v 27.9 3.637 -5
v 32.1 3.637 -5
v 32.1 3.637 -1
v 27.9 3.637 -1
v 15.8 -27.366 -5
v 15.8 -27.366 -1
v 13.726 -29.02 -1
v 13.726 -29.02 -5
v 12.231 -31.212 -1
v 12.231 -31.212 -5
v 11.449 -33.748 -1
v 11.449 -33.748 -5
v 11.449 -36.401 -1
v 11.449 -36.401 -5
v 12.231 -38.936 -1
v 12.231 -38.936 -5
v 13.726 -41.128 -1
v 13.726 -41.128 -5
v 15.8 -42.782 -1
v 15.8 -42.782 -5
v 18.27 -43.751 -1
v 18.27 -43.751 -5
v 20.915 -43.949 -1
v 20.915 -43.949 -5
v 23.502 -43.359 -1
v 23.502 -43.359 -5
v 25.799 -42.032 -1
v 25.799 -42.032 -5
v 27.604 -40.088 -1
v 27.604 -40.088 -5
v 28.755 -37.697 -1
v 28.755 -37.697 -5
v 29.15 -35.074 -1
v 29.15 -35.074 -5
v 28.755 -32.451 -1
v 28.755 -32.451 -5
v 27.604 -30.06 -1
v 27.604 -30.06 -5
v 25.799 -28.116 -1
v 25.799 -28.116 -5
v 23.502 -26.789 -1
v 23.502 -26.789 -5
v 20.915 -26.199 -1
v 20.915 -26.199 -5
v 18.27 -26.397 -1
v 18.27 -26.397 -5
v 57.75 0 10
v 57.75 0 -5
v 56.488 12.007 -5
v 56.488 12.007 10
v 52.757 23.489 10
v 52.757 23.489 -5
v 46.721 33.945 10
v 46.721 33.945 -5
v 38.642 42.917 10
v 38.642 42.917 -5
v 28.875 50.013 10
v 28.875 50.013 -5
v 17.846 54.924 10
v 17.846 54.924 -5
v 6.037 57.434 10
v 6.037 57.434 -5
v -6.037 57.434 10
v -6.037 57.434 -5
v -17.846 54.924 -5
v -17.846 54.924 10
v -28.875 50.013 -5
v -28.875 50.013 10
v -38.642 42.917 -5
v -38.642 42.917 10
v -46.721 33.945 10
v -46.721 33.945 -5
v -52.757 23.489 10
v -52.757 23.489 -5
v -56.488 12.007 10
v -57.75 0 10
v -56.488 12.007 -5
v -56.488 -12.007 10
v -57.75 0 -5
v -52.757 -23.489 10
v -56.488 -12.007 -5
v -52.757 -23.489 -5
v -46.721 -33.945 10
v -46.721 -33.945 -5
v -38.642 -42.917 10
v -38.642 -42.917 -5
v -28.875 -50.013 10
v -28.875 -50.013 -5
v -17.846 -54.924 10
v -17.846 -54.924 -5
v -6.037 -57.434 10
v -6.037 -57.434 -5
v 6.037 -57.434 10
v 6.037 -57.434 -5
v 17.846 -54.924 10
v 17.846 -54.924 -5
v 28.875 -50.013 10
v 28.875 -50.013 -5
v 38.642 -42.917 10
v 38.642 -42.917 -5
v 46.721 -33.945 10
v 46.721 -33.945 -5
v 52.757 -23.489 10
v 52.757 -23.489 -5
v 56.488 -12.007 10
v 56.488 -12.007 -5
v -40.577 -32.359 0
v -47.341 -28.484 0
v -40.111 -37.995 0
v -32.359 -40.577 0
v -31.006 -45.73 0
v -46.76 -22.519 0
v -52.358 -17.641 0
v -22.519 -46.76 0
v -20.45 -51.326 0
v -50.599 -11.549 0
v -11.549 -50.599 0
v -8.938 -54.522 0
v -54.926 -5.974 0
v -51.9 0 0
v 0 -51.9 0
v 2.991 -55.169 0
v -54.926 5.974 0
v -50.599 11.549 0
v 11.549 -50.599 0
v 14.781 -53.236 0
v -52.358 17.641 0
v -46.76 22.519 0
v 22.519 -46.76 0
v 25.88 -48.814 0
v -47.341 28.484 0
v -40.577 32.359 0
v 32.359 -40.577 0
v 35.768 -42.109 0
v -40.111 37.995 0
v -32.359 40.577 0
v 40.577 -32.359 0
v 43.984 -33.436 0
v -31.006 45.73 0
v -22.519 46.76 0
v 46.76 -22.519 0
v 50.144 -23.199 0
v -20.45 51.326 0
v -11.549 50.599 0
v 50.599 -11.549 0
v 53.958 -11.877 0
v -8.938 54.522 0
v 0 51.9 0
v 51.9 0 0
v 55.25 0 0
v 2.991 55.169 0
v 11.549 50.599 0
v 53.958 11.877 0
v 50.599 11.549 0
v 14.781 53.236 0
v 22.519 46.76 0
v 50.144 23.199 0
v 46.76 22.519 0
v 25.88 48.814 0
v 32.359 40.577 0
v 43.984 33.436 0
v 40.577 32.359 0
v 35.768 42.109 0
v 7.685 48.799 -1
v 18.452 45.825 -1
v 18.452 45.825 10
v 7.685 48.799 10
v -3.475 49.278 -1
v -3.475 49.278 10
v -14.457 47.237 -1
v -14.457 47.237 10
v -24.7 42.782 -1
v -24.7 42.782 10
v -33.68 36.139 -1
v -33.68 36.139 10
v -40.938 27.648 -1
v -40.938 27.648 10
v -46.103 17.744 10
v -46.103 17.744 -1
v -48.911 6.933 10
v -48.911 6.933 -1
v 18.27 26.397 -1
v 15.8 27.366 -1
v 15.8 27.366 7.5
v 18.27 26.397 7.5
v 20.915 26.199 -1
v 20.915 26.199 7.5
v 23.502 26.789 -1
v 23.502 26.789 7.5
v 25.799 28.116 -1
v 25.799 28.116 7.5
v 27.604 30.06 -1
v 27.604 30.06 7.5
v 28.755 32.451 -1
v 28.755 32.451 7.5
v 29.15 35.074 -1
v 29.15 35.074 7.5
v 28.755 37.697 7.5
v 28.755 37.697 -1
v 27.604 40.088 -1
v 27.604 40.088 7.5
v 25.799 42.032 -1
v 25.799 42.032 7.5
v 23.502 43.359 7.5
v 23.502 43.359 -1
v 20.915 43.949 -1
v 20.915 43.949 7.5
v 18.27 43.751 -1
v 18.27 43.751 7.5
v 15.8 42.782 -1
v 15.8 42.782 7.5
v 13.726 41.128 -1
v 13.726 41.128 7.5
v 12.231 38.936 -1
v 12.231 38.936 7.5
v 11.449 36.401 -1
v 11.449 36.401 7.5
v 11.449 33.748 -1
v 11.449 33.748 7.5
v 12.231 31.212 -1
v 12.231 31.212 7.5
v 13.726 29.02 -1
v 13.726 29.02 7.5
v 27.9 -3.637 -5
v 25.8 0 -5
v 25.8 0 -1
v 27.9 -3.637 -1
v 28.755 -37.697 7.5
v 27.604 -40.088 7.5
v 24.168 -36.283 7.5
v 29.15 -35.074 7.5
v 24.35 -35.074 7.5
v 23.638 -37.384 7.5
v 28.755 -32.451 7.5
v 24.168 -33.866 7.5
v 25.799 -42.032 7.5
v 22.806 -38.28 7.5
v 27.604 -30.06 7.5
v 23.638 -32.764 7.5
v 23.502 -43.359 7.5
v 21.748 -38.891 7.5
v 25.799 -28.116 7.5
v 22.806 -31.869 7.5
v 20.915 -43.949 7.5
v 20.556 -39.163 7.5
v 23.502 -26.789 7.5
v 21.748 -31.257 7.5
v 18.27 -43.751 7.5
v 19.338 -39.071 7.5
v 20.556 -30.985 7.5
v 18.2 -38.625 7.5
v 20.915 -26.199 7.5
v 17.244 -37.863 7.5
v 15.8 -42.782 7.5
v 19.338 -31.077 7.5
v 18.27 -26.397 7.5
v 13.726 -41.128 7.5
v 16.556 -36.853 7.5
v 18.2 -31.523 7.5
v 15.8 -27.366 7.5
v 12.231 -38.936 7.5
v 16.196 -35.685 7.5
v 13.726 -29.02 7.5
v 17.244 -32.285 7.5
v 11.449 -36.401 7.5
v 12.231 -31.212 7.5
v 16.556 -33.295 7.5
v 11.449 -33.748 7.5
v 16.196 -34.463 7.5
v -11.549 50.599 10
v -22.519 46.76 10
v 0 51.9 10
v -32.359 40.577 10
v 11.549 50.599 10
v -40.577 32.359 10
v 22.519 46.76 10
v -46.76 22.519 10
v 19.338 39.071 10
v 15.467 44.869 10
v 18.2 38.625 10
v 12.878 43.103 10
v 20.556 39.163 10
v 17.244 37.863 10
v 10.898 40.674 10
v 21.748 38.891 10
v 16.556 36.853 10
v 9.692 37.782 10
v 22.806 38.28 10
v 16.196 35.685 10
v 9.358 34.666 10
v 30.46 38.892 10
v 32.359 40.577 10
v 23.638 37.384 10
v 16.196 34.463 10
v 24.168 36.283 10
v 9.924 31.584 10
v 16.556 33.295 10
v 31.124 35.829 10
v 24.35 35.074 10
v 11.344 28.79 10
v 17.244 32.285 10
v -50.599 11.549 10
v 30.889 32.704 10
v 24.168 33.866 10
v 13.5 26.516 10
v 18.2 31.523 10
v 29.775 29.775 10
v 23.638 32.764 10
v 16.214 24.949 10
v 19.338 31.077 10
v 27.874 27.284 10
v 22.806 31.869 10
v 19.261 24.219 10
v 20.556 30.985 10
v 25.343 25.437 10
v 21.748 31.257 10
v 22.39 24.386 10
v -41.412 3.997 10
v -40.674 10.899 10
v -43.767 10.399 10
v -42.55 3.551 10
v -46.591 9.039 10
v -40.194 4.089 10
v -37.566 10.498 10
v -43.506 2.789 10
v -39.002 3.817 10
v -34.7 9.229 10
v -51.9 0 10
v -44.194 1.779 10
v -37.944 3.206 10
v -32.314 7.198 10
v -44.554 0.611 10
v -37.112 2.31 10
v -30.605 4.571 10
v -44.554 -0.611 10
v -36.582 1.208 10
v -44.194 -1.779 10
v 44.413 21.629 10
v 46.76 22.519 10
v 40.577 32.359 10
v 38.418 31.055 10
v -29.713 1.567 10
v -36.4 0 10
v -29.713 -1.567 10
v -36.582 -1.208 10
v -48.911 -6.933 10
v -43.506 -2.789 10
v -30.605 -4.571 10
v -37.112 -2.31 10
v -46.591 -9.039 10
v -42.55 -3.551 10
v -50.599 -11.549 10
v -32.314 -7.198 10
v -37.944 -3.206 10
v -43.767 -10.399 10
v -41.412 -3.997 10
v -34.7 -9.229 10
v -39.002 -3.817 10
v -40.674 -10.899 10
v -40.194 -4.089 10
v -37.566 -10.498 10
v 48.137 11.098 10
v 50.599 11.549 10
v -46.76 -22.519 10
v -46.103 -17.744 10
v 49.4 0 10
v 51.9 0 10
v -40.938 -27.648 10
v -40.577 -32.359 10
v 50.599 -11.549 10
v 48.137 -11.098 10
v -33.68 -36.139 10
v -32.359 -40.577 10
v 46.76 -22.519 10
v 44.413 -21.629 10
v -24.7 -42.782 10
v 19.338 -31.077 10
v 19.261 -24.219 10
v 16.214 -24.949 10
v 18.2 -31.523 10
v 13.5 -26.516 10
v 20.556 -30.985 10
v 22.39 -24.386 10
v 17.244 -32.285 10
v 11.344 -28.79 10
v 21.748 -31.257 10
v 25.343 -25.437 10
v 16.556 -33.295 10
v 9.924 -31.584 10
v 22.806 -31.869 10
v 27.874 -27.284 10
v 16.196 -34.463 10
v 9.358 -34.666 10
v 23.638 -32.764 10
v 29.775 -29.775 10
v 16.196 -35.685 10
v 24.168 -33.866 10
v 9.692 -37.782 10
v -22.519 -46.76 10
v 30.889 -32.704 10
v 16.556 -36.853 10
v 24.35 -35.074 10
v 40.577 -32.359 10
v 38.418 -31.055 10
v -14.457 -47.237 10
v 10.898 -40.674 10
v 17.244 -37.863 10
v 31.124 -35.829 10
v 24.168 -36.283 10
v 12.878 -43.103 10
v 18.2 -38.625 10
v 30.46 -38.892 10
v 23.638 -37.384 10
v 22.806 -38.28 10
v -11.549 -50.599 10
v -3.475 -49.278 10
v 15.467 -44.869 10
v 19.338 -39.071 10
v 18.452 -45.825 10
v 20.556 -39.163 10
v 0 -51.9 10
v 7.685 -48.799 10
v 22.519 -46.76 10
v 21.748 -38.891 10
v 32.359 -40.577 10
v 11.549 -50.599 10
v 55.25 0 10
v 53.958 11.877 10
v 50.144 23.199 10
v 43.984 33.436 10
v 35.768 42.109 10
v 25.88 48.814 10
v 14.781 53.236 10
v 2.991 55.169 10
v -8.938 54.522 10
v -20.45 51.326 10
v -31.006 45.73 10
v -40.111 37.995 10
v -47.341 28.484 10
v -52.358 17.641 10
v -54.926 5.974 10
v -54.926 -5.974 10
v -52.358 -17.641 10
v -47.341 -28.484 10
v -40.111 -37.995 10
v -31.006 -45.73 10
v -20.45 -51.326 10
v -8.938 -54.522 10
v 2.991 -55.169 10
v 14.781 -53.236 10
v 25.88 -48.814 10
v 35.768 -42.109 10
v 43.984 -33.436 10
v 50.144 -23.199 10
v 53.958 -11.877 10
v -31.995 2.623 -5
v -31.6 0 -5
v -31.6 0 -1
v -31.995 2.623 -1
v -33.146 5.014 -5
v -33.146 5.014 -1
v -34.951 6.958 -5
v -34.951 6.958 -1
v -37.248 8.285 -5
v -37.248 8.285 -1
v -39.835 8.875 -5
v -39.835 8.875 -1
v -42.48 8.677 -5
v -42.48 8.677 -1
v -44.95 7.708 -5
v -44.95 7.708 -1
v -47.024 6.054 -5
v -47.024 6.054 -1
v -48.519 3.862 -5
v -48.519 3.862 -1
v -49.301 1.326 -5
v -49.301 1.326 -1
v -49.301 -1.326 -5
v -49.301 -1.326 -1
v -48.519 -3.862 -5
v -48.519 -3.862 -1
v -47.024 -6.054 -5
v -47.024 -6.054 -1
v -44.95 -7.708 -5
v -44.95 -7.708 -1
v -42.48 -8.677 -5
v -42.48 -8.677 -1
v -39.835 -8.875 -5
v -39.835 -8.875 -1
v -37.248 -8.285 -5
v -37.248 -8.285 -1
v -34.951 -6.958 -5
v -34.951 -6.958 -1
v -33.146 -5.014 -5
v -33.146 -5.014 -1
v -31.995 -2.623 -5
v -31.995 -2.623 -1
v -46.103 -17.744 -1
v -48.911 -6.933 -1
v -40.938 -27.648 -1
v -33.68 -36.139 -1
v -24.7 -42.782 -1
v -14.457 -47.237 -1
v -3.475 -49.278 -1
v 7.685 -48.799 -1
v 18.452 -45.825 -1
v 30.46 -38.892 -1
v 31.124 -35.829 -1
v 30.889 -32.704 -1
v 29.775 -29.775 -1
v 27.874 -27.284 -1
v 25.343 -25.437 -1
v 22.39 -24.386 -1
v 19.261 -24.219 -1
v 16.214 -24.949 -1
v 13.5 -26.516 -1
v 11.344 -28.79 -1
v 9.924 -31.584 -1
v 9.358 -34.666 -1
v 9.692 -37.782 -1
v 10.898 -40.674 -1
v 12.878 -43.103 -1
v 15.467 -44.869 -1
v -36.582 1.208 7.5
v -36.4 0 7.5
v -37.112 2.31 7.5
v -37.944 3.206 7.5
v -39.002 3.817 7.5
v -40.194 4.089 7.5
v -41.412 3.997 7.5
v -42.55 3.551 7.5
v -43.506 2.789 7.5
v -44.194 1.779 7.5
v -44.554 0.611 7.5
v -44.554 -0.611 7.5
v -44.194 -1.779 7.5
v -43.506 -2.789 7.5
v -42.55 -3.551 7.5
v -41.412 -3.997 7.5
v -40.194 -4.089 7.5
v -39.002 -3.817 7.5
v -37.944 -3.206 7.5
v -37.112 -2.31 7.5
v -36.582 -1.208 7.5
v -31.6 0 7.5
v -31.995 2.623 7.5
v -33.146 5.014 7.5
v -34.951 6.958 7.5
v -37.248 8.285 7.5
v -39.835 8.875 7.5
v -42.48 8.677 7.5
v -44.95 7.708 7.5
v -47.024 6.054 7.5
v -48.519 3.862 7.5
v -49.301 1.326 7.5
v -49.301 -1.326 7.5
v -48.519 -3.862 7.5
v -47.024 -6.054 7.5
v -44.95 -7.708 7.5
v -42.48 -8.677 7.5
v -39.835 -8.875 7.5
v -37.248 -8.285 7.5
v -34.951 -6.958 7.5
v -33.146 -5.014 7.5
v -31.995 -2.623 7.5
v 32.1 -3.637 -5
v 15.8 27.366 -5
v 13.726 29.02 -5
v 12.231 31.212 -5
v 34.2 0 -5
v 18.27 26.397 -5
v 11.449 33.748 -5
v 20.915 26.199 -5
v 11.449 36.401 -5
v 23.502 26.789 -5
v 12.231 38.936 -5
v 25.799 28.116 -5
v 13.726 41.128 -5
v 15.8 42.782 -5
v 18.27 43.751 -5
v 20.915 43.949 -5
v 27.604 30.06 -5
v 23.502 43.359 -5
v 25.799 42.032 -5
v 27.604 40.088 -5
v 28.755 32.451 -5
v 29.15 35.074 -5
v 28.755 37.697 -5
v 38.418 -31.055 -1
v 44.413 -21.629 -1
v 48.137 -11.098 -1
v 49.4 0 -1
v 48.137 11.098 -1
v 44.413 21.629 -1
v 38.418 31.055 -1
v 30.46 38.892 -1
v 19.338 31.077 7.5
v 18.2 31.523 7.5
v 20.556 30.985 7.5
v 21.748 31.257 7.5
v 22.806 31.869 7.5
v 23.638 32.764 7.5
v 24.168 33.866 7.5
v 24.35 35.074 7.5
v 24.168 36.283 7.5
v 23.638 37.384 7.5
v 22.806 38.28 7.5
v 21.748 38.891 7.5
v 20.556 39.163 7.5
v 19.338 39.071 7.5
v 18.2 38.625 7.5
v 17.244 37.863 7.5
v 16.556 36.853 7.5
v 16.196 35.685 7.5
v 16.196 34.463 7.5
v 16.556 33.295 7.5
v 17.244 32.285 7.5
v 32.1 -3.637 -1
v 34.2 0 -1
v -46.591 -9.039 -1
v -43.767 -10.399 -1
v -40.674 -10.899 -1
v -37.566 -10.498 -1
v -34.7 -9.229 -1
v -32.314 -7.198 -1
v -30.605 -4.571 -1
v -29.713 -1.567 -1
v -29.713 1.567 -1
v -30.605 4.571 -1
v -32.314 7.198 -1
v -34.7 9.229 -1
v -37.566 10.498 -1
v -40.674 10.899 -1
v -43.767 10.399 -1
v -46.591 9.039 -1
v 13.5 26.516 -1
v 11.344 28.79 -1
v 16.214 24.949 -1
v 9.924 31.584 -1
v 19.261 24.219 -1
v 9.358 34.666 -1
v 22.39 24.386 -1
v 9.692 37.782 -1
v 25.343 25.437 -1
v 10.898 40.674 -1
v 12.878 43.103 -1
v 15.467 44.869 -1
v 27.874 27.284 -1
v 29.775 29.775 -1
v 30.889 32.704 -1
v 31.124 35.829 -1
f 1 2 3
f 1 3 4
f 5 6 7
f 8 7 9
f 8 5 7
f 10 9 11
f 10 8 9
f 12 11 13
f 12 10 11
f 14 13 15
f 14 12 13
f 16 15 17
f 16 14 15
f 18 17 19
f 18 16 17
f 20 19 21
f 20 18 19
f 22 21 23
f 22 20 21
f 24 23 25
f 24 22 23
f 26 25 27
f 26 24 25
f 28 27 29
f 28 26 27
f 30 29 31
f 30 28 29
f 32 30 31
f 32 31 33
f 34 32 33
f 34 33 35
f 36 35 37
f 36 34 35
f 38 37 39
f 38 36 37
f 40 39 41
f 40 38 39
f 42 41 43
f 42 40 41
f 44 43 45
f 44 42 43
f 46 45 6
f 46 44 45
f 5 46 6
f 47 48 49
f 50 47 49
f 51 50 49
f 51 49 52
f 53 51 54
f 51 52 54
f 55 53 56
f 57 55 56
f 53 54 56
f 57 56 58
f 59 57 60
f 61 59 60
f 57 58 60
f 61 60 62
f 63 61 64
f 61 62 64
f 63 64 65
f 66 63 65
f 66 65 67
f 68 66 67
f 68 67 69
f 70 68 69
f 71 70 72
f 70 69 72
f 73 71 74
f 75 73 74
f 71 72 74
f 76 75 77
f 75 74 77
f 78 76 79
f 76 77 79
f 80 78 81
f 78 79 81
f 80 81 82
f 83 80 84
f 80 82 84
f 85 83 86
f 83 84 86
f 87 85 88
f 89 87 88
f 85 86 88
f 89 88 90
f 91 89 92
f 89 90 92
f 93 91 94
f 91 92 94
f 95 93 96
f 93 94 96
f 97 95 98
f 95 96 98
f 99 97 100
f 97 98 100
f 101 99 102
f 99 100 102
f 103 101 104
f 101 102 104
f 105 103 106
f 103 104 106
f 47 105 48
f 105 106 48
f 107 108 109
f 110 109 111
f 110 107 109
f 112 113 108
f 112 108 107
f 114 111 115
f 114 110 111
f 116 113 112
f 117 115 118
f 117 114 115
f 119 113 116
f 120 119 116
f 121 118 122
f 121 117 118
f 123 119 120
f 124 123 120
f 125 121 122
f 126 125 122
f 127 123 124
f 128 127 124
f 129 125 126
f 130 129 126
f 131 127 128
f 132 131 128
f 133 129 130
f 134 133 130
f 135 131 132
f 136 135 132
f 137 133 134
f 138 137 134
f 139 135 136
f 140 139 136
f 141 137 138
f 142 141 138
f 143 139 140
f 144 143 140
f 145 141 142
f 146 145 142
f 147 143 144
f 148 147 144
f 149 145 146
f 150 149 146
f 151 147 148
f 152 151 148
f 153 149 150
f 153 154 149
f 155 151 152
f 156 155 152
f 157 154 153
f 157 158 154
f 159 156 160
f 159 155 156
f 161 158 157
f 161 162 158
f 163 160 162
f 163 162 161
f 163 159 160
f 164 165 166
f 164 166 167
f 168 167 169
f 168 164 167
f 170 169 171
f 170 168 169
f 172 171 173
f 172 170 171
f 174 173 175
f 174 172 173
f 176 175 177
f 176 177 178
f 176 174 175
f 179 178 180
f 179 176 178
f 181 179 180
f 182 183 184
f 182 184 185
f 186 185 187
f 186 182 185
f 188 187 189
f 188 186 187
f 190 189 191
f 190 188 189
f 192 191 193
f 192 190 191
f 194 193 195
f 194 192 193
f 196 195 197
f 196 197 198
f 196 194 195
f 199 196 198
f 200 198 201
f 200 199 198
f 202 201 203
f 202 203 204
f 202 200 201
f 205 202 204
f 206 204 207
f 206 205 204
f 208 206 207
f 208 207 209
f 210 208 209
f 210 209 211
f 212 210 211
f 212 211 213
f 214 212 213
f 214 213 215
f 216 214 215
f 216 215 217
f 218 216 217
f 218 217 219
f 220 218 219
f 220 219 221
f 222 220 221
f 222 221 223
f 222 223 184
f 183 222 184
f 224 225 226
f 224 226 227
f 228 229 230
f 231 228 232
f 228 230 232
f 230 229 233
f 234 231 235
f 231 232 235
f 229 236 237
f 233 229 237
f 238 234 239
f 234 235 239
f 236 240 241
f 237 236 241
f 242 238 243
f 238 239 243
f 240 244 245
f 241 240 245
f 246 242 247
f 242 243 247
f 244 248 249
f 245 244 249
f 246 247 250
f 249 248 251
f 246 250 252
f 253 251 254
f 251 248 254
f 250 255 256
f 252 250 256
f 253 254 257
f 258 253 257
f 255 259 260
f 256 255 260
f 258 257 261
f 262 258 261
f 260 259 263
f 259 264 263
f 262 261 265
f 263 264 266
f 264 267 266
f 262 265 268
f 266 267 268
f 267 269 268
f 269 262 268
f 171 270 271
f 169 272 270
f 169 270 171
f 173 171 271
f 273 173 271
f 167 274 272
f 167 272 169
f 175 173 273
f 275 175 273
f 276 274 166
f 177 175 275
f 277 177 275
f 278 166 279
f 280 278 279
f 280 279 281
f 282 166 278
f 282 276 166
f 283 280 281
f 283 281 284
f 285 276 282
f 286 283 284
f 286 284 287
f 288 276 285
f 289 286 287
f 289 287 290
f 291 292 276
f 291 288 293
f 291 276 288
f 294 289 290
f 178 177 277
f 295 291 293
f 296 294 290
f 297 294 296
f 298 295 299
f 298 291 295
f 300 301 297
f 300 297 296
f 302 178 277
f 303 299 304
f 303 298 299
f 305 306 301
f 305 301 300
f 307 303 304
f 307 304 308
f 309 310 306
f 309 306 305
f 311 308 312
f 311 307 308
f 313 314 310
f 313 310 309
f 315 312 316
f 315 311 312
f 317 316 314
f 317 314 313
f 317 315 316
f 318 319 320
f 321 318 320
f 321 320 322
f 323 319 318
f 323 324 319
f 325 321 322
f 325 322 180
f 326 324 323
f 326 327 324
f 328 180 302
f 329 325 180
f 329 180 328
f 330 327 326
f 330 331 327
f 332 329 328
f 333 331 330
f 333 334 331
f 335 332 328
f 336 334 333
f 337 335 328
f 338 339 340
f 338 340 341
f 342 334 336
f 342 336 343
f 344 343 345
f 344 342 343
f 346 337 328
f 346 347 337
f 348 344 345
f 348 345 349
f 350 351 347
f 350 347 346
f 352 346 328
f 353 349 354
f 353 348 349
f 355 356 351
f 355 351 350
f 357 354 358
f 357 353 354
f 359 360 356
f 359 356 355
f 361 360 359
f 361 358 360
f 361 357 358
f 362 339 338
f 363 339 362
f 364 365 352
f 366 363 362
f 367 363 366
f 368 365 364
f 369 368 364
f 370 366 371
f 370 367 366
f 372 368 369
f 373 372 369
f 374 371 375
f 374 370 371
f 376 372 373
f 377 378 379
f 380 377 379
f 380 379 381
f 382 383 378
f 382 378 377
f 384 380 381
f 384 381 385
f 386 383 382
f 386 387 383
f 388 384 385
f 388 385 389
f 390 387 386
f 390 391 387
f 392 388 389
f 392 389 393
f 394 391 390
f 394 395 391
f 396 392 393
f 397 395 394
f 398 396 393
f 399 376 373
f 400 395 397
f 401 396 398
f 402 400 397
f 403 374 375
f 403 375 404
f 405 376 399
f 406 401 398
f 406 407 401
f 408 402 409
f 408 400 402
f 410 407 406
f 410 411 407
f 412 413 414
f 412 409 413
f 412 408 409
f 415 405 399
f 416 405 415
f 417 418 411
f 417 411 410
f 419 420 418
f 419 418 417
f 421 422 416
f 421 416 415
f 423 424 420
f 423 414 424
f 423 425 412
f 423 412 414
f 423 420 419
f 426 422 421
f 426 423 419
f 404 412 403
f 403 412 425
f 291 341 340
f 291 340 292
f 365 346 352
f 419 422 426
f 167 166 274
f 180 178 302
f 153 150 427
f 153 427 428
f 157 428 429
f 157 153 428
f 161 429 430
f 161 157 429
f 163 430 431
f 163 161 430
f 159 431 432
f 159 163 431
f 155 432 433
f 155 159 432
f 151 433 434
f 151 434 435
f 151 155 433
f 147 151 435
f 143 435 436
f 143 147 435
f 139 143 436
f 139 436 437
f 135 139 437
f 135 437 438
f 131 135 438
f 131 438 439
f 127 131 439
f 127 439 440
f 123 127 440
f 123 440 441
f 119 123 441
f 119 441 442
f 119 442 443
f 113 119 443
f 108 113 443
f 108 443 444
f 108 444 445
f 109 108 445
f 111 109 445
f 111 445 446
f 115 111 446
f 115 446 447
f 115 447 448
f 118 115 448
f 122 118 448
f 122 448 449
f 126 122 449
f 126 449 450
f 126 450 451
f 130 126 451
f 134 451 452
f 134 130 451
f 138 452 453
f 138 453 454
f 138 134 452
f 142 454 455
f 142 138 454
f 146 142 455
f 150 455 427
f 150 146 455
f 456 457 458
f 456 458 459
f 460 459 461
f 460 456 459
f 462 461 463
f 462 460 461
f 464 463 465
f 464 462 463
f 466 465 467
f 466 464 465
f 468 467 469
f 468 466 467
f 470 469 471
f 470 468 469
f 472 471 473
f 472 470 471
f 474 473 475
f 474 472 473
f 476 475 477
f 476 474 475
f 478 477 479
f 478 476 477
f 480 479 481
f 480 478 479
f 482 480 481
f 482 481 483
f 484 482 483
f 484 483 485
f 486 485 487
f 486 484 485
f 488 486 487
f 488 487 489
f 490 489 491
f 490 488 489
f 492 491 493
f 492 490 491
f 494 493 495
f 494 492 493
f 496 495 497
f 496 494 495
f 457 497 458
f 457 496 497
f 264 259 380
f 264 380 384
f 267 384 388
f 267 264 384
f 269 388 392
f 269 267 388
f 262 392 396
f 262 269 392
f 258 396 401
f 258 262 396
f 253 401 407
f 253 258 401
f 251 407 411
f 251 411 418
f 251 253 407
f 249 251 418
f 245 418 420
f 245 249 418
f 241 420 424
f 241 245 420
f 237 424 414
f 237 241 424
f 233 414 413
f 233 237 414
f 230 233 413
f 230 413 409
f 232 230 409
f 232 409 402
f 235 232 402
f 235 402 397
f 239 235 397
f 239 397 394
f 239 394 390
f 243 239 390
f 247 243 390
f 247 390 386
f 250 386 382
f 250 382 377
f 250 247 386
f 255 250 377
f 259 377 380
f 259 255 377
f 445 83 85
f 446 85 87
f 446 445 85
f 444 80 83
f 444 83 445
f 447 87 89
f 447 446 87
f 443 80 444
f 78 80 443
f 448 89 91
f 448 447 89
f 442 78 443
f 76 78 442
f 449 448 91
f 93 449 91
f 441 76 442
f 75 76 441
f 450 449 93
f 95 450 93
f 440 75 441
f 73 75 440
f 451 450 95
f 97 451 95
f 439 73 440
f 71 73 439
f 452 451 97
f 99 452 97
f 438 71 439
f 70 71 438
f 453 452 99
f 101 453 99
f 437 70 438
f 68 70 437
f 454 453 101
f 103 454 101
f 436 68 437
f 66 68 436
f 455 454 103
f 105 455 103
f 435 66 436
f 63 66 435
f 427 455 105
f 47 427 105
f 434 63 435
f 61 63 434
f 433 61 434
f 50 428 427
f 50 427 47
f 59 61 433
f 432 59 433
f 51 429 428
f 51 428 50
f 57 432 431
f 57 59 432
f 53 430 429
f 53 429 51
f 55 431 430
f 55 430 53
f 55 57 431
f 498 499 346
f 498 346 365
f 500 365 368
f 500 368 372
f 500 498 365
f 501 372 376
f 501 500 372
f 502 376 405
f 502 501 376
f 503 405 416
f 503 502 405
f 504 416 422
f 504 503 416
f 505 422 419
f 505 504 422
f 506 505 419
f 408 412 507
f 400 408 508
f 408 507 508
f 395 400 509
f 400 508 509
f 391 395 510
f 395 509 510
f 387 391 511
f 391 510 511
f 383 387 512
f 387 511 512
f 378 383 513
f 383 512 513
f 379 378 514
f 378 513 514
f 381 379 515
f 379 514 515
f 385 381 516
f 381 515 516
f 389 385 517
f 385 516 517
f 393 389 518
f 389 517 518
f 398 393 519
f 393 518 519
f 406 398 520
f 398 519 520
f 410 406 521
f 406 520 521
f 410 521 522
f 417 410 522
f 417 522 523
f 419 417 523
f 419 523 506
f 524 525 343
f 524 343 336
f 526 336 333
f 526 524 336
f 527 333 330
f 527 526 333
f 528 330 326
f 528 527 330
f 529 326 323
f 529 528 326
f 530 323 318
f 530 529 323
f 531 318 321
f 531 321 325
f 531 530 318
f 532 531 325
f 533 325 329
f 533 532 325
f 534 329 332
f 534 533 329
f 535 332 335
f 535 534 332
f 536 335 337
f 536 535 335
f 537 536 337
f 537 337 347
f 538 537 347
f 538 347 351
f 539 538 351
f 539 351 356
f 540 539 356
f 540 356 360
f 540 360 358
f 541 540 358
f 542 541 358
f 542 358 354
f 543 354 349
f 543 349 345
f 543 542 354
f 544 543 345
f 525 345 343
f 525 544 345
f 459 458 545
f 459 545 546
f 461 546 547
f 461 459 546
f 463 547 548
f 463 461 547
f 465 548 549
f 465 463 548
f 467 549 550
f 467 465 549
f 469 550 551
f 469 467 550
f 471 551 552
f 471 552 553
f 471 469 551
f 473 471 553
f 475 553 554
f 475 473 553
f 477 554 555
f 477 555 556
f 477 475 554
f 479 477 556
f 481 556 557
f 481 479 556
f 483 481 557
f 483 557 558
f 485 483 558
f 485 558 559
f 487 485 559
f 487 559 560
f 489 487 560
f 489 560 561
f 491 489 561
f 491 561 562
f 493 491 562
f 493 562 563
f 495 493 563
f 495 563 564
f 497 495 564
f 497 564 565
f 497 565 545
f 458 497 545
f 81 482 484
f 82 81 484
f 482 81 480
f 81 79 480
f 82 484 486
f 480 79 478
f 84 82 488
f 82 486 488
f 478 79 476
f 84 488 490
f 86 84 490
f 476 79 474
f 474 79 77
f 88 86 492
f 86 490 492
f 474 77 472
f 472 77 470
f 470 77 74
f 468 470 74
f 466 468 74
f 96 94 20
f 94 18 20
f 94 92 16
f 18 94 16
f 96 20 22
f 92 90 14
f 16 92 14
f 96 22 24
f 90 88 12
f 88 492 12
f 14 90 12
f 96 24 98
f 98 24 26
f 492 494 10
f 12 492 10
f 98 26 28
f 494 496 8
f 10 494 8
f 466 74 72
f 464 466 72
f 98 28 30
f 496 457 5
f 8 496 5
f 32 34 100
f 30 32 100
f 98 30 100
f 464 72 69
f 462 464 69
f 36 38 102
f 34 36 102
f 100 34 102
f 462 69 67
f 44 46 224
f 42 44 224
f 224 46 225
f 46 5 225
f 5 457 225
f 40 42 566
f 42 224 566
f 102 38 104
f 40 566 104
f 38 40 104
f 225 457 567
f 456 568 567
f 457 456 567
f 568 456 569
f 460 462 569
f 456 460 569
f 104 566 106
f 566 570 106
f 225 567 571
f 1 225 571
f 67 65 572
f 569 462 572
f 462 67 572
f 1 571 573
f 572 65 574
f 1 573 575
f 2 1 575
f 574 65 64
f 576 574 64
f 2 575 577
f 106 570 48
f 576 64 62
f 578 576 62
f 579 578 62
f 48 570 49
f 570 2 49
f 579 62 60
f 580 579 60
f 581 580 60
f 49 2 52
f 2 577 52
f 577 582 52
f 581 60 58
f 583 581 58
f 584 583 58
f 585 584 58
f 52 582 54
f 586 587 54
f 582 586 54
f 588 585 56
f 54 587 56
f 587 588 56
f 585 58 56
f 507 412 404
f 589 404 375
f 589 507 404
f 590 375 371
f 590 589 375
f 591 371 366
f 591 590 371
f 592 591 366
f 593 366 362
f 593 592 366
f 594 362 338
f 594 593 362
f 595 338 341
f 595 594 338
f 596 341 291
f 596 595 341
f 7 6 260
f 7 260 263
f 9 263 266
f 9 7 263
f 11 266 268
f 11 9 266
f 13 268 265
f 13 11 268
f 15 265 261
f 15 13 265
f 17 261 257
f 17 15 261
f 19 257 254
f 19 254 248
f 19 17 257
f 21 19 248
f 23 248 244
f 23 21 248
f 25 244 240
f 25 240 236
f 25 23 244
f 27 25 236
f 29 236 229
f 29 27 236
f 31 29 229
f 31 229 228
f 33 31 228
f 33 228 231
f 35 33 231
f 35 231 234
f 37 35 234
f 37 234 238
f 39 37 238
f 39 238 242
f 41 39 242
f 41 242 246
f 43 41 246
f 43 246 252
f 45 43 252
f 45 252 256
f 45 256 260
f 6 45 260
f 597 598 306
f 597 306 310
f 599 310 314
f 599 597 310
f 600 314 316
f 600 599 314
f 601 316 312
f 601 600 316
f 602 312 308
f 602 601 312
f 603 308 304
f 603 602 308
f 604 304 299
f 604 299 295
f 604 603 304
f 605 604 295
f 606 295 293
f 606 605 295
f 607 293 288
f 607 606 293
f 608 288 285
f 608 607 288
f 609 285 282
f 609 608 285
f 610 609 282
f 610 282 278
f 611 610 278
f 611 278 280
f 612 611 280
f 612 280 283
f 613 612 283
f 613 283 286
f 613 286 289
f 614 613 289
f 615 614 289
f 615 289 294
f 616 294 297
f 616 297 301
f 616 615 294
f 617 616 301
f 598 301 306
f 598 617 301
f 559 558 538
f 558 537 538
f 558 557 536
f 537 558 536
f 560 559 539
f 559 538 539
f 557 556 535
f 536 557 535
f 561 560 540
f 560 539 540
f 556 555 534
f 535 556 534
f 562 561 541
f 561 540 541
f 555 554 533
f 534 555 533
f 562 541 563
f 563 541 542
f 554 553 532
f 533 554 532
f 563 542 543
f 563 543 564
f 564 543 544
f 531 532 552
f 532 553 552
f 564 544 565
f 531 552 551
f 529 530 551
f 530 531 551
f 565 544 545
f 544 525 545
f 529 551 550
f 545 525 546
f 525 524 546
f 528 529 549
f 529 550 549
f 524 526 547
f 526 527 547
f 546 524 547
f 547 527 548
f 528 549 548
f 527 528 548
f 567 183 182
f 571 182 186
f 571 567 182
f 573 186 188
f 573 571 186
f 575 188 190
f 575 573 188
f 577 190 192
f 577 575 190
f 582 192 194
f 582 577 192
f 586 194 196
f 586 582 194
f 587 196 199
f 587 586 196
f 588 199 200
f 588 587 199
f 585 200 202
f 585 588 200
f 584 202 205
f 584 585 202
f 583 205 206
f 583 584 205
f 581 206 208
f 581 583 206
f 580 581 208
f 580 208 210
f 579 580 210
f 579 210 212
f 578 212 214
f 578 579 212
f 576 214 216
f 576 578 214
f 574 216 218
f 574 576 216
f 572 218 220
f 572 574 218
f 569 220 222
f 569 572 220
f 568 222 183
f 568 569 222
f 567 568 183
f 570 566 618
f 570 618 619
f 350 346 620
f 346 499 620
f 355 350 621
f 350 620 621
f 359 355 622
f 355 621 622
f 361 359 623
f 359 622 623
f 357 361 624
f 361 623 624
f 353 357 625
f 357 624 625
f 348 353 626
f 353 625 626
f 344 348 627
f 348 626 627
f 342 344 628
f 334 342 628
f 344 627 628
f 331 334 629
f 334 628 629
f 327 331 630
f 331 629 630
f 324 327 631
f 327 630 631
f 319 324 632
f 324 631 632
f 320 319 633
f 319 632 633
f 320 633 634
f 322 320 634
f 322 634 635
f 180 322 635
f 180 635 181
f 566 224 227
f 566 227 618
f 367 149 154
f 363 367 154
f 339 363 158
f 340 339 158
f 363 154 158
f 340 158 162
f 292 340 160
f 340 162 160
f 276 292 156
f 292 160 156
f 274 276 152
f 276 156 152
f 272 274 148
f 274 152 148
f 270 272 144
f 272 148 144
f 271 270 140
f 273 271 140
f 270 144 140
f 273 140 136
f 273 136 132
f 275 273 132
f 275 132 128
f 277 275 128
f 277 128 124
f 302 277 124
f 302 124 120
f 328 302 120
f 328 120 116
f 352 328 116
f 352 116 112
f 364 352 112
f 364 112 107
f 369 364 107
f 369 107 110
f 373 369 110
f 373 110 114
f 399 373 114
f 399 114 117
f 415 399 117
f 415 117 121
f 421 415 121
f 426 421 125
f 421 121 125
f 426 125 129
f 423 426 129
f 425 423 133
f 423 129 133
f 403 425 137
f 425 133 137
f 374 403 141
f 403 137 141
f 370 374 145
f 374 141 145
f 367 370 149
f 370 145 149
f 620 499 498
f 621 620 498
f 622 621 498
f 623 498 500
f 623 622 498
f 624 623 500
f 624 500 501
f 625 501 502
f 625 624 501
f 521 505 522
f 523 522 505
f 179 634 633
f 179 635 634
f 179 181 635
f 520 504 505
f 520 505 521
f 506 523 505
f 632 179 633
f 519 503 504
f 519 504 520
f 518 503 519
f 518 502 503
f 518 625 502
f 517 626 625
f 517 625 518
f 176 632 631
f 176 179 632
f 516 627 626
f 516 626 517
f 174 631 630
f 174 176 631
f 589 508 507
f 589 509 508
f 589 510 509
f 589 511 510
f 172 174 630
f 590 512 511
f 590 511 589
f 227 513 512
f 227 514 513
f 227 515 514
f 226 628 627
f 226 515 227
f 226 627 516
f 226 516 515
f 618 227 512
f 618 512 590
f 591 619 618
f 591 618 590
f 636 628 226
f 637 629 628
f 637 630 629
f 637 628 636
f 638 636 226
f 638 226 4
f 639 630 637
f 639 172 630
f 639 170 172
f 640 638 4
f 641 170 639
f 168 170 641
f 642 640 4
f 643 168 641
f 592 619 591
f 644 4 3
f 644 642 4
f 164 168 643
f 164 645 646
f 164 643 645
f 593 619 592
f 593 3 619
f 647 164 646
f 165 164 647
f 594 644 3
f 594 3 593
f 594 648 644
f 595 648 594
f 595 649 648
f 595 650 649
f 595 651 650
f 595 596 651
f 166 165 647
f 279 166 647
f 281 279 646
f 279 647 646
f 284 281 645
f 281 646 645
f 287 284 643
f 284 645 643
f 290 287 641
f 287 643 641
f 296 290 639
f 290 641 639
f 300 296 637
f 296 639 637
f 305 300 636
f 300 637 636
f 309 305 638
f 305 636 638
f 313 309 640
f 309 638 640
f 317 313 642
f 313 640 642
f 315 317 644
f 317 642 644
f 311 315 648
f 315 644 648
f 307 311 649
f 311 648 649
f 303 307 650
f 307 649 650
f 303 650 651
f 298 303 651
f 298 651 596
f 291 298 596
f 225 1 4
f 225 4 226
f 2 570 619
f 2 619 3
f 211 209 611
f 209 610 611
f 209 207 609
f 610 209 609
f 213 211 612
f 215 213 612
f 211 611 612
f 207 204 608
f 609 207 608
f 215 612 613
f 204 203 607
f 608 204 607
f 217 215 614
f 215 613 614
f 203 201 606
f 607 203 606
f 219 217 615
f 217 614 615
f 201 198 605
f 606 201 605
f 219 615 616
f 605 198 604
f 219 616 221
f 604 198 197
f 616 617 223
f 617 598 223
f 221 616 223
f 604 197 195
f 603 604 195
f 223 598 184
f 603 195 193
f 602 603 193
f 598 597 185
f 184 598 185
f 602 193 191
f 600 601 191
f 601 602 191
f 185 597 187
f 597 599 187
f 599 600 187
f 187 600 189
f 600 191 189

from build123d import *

# Parameters (mm, degrees)
EXTRUDE002_DEPTH  = 4
TUBE029_R         = 57.75
TUBE029_R_2       = 55.25
TUBE029_DEPTH     = 15
TUBE027_R         = 51.9
TUBE027_R_2       = 49.4
TUBE027_DEPTH     = 15
TUBE030_R         = 10.9
TUBE030_R_2       = 8.9
TUBE030_DEPTH     = 11
TUBE031_R         = 8.9
TUBE031_R_2       = 4.1
TUBE031_DEPTH     = 2.5
ARRAY034_COUNT    = 3
CYLINDER030_R     = 8.9
CYLINDER030_DEPTH = 4
ARRAY033_COUNT    = 3
CYLINDER029_R     = 49.4
CYLINDER029_DEPTH = 4
TUBE028_R         = 55.25
TUBE028_R_2       = 51.75
TUBE028_DEPTH     = 5


with BuildPart() as valvecutter:
    # Face002 → Extrude002 (new body)
    with BuildSketch(Plane(origin=(0, 0, 0), x_dir=(0, 1, 0), z_dir=(0, 0, 1))):
        Polygon((0, -4.2), (3.637307, -2.1), (3.637307, 2.1), (0, 4.2), (-3.637307, 2.1), (-3.637307, -2.1), align=None)
    extrude(amount=EXTRUDE002_DEPTH)


with BuildPart() as valvecutter_1:
    # Extrude002 placement: moved
    add(valvecutter.part.moved(Location((30, 0, -5))))


with BuildPart() as lidconnectorouter:
    # Tube029 → Tube029 (new body)
    with BuildSketch(Plane.XY.offset(-5)):
        Circle(TUBE029_R)
        Circle(TUBE029_R_2, mode=Mode.SUBTRACT)
    extrude(amount=TUBE029_DEPTH)


with BuildPart() as lidconnectorinner:
    # Tube027 → Tube027 (new body)
    with BuildSketch(Plane.XY.offset(-5)):
        Circle(TUBE027_R)
        Circle(TUBE027_R_2, mode=Mode.SUBTRACT)
    extrude(amount=TUBE027_DEPTH)


with BuildPart() as lidrailguide:
    # Tube030 → Tube030 (new body)
    with BuildSketch(Plane(origin=(-40.5, 0, -1), x_dir=(1, 0, 0), z_dir=(0, 0, 1))):
        Circle(TUBE030_R)
        Circle(TUBE030_R_2, mode=Mode.SUBTRACT)
    extrude(amount=TUBE030_DEPTH)


with BuildPart() as lidrailguides:
    # Tube031 → Tube031 (new body)
    with BuildSketch(Plane(origin=(-40.5, 0, 7.5), x_dir=(1, 0, 0), z_dir=(0, 0, 1))):
        Circle(TUBE031_R)
        Circle(TUBE031_R_2, mode=Mode.SUBTRACT)
    extrude(amount=TUBE031_DEPTH)

    # Fusion016: union LidRailGuide
    add(lidrailguide.part)

    # Array034: LidRailGuides ×3 about axis
    array034_axis = Axis((0, 0, 0), (0, 0, 1))


with BuildPart() as lidrailguides_1:
    add(lidrailguides.part)
    for i in range(1, ARRAY034_COUNT):
        add(lidrailguides.part.rotate(array034_axis, i * 360 / ARRAY034_COUNT))


with BuildPart() as lidnutcutters:
    # Cylinder030 → Cylinder030 (new body)
    with BuildSketch(Plane(origin=(-40.5, 0, -5), x_dir=(1, 0, 0), z_dir=(0, 0, 1))):
        Circle(CYLINDER030_R)
    extrude(amount=CYLINDER030_DEPTH)

    # Array033: LidNutCutters ×3 about axis
    array033_axis = Axis((0, 0, 0), (0, 0, 1))


with BuildPart() as lidnutcutters_1:
    add(lidnutcutters.part)
    for i in range(1, ARRAY033_COUNT):
        add(lidnutcutters.part.rotate(array033_axis, i * 360 / ARRAY033_COUNT))


with BuildPart() as lid1:
    # Cylinder029 → Cylinder029 (new body)
    with BuildSketch(Plane.XY.offset(-5)):
        Circle(CYLINDER029_R)
    extrude(amount=CYLINDER029_DEPTH)

    # Cut056: cut LidNutCutters
    add(lidnutcutters_1.part, mode=Mode.SUBTRACT)


with BuildPart() as lid3:
    # Tube028 → Tube028 (new body)
    with BuildSketch(Plane.XY.offset(-5)):
        Circle(TUBE028_R)
        Circle(TUBE028_R_2, mode=Mode.SUBTRACT)
    extrude(amount=TUBE028_DEPTH)

    # Fusion017: union LidConnectorOuter, LidConnectorInner, LidRailGuides, Lid1
    add(lidconnectorouter.part)
    add(lidconnectorinner.part)
    add(lidrailguides_1.part)
    add(lid1.part)

    # Cut057: cut ValveCutter
    add(valvecutter_1.part, mode=Mode.SUBTRACT)


solid = lid3.part
